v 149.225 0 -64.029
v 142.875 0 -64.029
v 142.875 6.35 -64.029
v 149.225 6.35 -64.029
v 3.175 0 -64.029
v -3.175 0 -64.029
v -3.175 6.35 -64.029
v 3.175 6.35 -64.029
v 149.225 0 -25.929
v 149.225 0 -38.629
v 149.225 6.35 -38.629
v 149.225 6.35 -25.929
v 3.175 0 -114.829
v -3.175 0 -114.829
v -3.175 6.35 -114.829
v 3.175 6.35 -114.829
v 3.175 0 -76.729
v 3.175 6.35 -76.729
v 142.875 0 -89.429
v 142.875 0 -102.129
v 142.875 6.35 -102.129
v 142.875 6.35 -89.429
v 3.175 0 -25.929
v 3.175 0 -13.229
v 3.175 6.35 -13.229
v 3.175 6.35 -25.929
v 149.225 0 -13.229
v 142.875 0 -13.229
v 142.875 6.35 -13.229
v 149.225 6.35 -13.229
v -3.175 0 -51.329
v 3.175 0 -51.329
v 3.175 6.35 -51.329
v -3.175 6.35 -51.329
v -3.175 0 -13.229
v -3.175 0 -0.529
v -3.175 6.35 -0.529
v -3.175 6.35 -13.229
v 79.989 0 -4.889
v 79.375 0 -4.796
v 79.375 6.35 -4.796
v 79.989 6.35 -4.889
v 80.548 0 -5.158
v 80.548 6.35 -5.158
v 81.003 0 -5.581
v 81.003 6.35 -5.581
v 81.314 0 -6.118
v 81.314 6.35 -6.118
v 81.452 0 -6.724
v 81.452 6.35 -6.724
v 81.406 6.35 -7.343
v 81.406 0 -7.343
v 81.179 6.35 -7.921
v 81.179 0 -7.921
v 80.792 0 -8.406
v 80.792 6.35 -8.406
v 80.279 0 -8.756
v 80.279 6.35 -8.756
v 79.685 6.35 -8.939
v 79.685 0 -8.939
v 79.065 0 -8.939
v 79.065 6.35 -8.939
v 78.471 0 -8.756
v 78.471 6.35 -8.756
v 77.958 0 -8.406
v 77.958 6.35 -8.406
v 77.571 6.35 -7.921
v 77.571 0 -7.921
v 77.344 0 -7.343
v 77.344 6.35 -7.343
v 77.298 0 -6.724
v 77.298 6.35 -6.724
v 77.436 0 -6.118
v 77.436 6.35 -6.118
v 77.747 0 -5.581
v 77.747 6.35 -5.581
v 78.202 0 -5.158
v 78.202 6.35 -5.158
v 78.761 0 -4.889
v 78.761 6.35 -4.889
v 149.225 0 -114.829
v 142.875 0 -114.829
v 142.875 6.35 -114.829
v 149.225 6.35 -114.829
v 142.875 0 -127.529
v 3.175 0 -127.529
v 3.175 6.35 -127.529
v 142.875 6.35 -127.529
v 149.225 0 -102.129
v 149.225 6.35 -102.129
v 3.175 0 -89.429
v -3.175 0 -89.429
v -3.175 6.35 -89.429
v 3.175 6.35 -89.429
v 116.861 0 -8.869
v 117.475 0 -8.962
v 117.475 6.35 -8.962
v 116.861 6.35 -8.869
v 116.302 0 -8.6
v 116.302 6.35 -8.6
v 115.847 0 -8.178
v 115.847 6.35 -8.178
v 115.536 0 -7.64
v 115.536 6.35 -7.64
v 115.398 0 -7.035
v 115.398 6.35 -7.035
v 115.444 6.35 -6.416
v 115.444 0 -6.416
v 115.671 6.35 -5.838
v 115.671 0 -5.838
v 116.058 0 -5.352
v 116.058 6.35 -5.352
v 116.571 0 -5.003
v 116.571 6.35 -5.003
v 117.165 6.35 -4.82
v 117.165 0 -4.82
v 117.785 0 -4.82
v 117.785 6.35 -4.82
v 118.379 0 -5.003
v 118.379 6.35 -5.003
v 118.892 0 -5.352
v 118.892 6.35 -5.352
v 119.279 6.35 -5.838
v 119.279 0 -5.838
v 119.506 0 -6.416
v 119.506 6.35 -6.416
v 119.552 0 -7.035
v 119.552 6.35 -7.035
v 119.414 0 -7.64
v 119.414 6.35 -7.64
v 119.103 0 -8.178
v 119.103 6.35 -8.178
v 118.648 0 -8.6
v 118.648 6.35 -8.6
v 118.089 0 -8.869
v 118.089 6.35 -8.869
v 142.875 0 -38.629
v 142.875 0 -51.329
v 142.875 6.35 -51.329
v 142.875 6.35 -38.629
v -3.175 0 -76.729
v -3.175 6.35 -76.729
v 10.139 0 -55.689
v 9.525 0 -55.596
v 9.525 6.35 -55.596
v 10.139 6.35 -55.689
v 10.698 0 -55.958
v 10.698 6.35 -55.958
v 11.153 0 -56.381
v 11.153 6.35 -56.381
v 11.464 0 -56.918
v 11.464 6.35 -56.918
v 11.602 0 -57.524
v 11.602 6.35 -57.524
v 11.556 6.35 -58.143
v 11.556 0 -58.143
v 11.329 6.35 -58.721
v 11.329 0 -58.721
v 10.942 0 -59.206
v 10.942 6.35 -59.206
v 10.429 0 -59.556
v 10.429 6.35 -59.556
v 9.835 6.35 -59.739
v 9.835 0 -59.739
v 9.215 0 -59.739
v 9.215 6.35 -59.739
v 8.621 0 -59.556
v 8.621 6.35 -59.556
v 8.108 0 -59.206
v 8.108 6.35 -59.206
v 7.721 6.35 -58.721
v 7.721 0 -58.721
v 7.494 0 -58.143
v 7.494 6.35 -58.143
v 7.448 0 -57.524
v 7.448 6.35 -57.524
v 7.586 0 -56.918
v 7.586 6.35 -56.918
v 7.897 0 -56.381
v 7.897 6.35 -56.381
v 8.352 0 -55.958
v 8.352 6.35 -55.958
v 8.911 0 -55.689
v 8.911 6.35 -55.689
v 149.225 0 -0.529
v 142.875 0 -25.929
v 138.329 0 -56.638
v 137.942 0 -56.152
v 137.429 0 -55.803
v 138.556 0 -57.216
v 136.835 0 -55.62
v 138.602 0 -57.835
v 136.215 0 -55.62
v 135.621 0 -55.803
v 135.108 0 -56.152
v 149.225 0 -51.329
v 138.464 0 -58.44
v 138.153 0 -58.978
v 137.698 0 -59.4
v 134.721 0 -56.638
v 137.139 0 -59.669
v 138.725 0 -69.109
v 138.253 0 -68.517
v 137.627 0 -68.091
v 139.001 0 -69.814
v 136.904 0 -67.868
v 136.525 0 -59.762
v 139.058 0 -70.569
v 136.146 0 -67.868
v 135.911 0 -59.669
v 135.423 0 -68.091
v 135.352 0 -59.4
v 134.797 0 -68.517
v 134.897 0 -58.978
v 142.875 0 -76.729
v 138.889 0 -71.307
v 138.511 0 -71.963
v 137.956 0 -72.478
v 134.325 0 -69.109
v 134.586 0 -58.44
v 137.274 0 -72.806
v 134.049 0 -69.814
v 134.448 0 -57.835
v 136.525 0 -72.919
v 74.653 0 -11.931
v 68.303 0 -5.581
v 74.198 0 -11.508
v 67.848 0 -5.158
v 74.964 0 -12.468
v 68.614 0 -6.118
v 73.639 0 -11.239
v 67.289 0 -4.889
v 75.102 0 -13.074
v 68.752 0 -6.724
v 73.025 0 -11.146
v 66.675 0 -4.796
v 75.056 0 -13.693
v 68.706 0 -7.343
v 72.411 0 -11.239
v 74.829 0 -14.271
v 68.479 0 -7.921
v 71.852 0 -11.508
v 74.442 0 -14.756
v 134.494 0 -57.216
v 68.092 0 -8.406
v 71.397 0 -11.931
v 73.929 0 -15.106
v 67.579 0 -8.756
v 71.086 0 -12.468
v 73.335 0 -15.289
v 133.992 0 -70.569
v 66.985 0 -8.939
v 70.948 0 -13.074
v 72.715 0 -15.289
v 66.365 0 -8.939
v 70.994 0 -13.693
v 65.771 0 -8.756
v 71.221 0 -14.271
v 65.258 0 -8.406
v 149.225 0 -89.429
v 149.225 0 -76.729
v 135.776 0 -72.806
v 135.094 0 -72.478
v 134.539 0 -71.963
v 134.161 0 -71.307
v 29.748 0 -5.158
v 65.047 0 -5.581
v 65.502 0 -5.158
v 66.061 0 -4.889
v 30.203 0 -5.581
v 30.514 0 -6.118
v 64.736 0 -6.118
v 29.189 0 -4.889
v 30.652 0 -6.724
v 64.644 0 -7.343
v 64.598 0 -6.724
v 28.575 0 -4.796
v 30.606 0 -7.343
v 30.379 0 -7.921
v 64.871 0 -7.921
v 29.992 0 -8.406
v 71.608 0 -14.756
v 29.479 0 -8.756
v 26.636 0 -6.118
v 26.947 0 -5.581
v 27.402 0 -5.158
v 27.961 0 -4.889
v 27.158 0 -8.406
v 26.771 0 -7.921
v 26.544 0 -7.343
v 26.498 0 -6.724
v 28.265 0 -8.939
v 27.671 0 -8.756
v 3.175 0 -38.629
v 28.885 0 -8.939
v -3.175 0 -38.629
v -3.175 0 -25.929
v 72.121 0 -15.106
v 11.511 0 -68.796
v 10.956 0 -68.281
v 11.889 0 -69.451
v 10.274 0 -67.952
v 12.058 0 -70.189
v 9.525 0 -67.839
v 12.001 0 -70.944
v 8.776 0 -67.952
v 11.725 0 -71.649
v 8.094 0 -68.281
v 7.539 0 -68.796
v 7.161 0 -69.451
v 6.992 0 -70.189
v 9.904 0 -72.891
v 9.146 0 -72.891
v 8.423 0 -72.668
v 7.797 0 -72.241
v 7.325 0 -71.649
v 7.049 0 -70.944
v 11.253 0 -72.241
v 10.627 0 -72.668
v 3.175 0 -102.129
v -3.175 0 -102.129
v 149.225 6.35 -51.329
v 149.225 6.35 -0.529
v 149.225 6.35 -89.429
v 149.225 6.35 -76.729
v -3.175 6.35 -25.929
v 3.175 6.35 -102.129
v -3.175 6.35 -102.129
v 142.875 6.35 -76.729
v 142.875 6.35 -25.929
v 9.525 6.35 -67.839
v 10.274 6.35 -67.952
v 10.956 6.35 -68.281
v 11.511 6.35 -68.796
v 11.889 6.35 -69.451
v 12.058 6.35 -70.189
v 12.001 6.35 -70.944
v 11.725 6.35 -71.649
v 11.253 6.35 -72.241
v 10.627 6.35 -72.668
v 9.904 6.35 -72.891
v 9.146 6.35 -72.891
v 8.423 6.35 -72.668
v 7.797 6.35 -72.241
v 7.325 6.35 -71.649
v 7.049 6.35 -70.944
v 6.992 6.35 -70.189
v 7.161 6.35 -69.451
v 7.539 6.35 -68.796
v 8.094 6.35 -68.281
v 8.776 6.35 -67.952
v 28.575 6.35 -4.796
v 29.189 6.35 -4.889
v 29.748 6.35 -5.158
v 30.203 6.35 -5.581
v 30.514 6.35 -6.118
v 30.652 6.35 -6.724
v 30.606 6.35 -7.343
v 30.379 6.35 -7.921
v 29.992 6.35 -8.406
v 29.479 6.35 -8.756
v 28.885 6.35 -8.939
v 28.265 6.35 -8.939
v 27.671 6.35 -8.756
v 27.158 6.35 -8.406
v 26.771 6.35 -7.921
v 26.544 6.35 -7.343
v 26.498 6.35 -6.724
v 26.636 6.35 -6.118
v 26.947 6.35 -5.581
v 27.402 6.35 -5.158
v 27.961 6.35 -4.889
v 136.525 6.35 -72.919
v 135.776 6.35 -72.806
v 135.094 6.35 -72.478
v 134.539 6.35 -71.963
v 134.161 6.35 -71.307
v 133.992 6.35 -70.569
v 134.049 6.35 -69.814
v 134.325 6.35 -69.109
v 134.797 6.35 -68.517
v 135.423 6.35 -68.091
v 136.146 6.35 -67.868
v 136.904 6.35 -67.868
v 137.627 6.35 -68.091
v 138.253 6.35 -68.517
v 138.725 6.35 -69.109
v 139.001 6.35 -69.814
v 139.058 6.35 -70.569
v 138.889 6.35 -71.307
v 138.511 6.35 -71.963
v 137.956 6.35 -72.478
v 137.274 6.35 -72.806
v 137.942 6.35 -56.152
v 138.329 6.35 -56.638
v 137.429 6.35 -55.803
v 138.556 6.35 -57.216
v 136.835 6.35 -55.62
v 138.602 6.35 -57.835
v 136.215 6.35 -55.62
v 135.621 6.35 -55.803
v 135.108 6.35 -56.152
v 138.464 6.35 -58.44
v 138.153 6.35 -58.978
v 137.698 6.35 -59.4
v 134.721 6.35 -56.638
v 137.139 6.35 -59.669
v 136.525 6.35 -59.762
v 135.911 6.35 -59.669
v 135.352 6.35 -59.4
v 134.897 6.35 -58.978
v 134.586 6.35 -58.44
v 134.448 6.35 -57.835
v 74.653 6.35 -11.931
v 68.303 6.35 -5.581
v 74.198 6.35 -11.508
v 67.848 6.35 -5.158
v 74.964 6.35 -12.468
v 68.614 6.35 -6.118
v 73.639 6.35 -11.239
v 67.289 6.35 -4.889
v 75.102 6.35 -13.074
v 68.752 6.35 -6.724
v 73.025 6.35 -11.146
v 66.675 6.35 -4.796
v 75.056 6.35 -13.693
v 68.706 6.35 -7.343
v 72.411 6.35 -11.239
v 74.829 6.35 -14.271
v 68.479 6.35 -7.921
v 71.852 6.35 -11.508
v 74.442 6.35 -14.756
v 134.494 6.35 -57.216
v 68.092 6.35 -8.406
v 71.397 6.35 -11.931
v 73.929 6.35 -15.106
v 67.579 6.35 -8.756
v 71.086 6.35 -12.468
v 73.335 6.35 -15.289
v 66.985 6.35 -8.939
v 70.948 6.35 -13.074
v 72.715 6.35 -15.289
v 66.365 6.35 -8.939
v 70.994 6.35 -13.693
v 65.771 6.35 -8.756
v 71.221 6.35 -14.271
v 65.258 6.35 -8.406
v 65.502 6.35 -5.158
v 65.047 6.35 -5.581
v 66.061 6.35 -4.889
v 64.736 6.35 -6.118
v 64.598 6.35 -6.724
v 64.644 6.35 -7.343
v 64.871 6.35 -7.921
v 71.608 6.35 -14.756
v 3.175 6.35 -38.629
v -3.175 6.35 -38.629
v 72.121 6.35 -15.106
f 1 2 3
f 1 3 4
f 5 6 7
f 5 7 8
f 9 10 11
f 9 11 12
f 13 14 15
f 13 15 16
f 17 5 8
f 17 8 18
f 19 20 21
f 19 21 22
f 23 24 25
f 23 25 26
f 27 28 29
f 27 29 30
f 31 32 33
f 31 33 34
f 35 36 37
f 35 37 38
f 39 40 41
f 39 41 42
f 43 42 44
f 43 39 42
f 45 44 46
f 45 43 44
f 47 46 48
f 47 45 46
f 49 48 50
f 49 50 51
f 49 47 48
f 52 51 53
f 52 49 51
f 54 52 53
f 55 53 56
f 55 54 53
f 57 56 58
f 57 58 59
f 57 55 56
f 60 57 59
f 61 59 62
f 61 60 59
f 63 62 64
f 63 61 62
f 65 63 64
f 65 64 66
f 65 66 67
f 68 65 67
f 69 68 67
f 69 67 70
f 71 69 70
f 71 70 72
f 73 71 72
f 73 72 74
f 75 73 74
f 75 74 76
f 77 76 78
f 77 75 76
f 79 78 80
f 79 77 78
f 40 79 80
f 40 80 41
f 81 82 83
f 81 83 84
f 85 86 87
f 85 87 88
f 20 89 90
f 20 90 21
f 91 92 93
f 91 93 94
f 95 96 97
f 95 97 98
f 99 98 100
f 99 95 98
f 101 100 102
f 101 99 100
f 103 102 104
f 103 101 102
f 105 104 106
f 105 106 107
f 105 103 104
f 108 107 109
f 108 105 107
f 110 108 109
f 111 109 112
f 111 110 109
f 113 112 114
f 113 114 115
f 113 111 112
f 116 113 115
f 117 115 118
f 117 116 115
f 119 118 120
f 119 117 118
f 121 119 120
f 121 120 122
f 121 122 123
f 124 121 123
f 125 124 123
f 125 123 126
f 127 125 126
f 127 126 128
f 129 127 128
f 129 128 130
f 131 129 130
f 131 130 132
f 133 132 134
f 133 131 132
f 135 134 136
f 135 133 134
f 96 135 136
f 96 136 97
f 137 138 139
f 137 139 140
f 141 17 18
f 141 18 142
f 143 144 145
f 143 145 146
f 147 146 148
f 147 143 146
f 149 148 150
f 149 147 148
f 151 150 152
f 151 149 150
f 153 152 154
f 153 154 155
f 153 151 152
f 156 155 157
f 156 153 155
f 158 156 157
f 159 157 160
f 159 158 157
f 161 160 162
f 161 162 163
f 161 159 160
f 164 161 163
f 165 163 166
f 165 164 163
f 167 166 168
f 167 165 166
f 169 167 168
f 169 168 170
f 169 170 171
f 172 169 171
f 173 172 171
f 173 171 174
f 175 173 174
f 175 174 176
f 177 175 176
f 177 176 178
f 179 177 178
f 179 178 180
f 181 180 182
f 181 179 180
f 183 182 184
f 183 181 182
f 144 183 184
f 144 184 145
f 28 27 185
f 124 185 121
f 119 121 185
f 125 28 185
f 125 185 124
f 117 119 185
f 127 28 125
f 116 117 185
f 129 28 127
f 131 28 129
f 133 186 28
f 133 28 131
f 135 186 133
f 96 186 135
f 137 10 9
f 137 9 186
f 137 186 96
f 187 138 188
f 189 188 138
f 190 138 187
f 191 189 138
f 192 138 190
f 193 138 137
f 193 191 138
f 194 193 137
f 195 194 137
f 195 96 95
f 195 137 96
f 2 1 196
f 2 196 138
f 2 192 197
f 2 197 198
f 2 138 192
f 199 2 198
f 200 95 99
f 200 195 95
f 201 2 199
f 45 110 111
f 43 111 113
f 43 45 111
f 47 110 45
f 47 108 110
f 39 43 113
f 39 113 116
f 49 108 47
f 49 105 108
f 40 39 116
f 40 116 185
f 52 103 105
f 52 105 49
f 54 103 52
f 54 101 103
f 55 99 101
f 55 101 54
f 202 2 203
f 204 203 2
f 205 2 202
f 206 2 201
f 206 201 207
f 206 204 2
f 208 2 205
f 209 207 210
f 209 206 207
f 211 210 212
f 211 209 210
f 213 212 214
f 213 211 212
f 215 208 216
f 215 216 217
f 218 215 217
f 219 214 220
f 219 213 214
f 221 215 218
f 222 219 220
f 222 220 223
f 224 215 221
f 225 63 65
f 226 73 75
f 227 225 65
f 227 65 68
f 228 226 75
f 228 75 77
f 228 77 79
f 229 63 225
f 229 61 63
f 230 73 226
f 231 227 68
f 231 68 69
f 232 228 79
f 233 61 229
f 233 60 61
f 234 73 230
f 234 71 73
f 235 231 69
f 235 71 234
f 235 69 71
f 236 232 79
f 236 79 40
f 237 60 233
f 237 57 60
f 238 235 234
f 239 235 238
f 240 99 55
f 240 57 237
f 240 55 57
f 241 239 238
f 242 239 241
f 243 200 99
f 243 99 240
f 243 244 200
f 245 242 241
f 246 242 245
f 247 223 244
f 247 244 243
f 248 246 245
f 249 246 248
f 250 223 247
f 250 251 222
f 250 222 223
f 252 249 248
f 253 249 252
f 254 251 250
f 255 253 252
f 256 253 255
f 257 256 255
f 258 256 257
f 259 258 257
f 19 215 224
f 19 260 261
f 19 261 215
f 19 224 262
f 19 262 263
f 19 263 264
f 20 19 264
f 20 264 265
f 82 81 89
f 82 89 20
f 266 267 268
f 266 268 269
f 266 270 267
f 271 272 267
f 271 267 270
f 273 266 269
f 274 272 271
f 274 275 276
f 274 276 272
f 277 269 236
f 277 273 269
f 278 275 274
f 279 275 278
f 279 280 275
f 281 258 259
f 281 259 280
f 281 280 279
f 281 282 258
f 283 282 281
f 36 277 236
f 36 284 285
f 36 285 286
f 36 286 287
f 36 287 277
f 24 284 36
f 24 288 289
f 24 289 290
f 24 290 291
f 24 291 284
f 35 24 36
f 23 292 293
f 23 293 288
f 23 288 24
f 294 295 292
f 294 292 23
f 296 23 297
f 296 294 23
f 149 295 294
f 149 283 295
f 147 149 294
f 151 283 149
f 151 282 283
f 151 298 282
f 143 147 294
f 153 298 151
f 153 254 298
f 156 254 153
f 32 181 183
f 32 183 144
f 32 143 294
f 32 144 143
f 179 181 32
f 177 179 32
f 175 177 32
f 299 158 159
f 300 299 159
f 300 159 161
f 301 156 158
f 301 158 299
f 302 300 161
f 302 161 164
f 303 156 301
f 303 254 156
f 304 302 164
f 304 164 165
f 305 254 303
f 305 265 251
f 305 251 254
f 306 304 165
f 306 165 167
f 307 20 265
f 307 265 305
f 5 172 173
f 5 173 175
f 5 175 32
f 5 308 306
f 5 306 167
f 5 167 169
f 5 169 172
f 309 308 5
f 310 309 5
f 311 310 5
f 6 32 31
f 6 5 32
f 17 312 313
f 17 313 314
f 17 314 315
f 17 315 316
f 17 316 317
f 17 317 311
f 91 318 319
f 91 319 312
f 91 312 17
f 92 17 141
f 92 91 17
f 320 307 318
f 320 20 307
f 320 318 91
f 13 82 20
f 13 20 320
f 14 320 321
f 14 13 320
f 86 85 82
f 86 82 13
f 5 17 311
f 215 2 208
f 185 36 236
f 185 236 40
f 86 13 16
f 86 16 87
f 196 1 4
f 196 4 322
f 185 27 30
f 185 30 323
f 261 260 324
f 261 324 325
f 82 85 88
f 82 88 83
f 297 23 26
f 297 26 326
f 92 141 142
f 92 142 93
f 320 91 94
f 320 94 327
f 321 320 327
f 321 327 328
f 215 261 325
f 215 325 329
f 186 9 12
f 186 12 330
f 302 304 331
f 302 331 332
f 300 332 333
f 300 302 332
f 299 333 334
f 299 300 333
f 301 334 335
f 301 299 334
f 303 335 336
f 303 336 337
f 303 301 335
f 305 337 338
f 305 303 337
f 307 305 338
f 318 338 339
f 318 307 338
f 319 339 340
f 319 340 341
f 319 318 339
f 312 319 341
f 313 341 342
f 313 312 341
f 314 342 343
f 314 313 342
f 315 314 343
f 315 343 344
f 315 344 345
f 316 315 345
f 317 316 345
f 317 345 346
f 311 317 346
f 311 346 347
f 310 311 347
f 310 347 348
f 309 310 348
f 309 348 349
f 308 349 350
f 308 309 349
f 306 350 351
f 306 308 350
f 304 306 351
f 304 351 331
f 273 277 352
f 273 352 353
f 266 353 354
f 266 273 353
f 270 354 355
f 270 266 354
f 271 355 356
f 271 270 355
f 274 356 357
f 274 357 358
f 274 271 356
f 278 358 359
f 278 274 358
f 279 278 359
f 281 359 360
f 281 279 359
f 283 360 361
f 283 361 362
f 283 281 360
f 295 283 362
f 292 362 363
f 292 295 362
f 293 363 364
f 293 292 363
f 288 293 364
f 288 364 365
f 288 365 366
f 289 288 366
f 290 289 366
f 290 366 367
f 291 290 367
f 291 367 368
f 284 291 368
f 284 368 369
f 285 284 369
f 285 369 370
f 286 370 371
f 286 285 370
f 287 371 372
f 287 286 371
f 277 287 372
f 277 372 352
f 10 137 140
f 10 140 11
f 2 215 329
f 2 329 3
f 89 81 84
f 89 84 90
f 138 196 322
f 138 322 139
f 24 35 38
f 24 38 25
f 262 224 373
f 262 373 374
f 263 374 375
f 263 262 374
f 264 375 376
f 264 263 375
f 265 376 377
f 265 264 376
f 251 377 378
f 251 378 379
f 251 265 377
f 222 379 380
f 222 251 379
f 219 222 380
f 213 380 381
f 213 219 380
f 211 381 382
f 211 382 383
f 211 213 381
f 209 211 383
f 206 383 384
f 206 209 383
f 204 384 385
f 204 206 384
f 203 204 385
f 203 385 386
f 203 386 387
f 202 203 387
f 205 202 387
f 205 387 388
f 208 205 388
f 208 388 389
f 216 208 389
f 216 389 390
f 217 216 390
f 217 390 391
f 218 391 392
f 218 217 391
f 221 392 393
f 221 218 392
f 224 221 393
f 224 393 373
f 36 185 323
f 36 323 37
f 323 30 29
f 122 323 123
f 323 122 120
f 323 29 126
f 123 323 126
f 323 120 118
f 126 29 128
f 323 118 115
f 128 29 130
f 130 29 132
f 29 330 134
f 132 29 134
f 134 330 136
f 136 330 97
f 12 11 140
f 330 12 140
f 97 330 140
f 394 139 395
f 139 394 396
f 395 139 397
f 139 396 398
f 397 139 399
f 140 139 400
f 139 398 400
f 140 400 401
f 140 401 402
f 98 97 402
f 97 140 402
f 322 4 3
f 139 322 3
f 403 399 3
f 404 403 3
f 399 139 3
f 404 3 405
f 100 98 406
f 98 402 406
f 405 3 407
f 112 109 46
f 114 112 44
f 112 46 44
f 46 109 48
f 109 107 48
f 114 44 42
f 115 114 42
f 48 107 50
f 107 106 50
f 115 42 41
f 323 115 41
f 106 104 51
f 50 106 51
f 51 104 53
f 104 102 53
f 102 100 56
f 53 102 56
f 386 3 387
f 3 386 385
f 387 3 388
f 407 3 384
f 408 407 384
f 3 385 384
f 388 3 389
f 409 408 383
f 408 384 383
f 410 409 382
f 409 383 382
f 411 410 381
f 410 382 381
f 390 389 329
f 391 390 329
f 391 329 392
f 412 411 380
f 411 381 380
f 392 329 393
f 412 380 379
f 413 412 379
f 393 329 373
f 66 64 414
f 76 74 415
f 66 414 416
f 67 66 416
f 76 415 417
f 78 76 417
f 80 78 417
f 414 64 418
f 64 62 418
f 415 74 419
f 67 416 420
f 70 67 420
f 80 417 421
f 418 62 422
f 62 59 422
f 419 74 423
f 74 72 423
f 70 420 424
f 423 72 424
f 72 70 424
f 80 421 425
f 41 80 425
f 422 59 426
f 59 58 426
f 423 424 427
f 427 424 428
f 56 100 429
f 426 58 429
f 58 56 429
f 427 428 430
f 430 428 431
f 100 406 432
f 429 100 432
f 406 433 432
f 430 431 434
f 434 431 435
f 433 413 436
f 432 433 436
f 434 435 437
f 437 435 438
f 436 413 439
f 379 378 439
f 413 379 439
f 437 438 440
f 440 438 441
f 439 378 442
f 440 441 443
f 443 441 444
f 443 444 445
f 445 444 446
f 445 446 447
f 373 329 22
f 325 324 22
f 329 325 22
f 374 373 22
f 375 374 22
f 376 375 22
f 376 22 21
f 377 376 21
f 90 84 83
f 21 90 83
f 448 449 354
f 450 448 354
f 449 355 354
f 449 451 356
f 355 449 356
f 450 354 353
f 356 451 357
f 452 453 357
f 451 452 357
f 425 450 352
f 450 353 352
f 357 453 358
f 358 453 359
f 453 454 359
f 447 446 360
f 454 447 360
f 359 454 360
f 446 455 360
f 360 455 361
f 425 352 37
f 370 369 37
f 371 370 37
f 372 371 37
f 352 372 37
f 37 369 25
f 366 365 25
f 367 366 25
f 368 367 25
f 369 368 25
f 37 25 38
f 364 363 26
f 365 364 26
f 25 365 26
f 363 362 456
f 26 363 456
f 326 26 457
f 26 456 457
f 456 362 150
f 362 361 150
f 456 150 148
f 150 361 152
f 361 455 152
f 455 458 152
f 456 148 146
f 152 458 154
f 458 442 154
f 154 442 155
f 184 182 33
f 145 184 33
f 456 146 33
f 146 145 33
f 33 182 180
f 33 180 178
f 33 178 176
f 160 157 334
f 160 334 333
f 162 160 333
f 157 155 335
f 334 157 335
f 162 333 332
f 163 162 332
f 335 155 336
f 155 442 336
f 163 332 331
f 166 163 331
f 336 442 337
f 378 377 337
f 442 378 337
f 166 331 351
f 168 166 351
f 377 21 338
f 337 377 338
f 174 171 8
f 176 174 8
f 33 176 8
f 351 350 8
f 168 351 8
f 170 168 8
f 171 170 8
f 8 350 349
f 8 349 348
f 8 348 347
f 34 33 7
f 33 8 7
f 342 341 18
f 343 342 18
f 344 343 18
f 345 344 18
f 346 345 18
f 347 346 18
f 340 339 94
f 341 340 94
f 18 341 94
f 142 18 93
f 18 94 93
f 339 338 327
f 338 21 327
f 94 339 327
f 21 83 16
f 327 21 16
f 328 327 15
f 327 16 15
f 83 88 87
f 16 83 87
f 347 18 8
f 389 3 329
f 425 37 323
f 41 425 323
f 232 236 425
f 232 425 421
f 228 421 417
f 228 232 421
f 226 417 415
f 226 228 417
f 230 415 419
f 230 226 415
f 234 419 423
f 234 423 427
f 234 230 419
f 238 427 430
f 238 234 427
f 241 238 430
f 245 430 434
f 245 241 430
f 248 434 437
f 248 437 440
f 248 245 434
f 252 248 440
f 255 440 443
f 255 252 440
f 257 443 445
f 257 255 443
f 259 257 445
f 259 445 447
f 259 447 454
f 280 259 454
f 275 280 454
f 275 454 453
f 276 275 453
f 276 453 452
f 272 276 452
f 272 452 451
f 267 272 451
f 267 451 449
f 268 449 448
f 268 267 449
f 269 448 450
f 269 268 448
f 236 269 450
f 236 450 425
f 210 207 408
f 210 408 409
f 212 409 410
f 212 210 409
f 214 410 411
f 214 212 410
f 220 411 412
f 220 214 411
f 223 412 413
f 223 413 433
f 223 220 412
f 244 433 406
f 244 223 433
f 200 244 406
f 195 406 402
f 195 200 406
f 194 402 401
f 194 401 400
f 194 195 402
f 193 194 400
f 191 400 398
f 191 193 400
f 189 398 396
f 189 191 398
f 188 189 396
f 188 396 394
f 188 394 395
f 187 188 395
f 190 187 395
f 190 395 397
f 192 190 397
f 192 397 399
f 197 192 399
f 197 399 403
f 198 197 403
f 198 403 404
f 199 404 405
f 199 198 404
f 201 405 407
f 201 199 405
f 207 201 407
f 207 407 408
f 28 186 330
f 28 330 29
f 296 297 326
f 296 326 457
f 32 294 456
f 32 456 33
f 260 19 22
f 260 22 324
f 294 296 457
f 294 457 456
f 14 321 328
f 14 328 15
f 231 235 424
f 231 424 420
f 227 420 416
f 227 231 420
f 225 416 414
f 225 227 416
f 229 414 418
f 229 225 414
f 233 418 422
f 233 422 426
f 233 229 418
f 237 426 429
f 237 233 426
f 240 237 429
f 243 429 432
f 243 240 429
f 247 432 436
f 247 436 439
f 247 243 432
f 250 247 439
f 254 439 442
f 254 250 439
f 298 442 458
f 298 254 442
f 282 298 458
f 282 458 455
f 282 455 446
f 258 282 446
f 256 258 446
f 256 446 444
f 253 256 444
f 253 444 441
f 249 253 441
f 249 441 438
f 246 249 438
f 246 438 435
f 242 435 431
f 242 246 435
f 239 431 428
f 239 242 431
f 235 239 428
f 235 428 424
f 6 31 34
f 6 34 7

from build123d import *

# Parameters (mm, degrees)
SKETCH2_R           = 2.0828
SKETCH2_R_2         = 2.54
BOSS_EXTRUDE1_DEPTH = 6.35


with BuildPart() as part:
    # Sketch2 → Boss-Extrude1 (new body)
    with BuildSketch(Plane(origin=(0, 0, 0), x_dir=(1, 0, 0), z_dir=(0, 1, 0))):
        Polygon((3.175, 13.229166667), (3.175, 25.929166667), (-3.175, 25.929166667), (-3.175, 38.629166667), (3.175, 38.629166667), (3.175, 51.329166667), (-3.175, 51.329166667), (-3.175, 64.029166667), (3.175, 64.029166667), (3.175, 76.729166667), (-3.175, 76.729166667), (-3.175, 89.429166667), (3.175, 89.429166667), (3.175, 102.129166667), (-3.175, 102.129166667), (-3.175, 114.829166667), (3.175, 114.829166667), (3.175, 127.529166667), (142.875, 127.529166667), (142.875, 114.829166667), (149.225, 114.829166667), (149.225, 102.129166667), (142.875, 102.129166667), (142.875, 89.429166667), (149.225, 89.429166667), (149.225, 76.729166667), (142.875, 76.729166667), (142.875, 64.029166667), (149.225, 64.029166667), (149.225, 51.329166667), (142.875, 51.329166667), (142.875, 38.629166667), (149.225, 38.629166667), (149.225, 25.929166667), (142.875, 25.929166667), (142.875, 13.229166667), (149.225, 13.229166667), (149.225, 0.529166667), (-3.175, 0.529166667), (-3.175, 13.229166667), align=None)
        with Locations(Location((136.525, 57.679166667, 0), (0, 0, 90))):
            Circle(SKETCH2_R, mode=Mode.SUBTRACT)
        with Locations(Location((28.575, 6.879166667, 0), (0, 0, 270))):
            Circle(SKETCH2_R, mode=Mode.SUBTRACT)
        with Locations(Location((9.525, 57.679166667, 0), (0, 0, 270))):
            Circle(SKETCH2_R, mode=Mode.SUBTRACT)
        with Locations(Location((117.475, 6.879166667, 0), (0, 0, 90))):
            Circle(SKETCH2_R, mode=Mode.SUBTRACT)
        with Locations(Location((79.375, 6.879166667, 0), (0, 0, 270))):
            Circle(SKETCH2_R, mode=Mode.SUBTRACT)
        with Locations(Location((73.025, 13.229166667, 0), (0, 0, 270))):
            Circle(SKETCH2_R, mode=Mode.SUBTRACT)
        with Locations(Location((66.675, 6.879166667, 0), (0, 0, 270))):
            Circle(SKETCH2_R, mode=Mode.SUBTRACT)
        with Locations(Location((9.525, 70.379166667, 0), (0, 0, 270))):
            Circle(SKETCH2_R_2, mode=Mode.SUBTRACT)
        with Locations(Location((136.525, 70.379166667, 0), (0, 0, 90))):
            Circle(SKETCH2_R_2, mode=Mode.SUBTRACT)
    extrude(amount=BOSS_EXTRUDE1_DEPTH)


solid = part.part
